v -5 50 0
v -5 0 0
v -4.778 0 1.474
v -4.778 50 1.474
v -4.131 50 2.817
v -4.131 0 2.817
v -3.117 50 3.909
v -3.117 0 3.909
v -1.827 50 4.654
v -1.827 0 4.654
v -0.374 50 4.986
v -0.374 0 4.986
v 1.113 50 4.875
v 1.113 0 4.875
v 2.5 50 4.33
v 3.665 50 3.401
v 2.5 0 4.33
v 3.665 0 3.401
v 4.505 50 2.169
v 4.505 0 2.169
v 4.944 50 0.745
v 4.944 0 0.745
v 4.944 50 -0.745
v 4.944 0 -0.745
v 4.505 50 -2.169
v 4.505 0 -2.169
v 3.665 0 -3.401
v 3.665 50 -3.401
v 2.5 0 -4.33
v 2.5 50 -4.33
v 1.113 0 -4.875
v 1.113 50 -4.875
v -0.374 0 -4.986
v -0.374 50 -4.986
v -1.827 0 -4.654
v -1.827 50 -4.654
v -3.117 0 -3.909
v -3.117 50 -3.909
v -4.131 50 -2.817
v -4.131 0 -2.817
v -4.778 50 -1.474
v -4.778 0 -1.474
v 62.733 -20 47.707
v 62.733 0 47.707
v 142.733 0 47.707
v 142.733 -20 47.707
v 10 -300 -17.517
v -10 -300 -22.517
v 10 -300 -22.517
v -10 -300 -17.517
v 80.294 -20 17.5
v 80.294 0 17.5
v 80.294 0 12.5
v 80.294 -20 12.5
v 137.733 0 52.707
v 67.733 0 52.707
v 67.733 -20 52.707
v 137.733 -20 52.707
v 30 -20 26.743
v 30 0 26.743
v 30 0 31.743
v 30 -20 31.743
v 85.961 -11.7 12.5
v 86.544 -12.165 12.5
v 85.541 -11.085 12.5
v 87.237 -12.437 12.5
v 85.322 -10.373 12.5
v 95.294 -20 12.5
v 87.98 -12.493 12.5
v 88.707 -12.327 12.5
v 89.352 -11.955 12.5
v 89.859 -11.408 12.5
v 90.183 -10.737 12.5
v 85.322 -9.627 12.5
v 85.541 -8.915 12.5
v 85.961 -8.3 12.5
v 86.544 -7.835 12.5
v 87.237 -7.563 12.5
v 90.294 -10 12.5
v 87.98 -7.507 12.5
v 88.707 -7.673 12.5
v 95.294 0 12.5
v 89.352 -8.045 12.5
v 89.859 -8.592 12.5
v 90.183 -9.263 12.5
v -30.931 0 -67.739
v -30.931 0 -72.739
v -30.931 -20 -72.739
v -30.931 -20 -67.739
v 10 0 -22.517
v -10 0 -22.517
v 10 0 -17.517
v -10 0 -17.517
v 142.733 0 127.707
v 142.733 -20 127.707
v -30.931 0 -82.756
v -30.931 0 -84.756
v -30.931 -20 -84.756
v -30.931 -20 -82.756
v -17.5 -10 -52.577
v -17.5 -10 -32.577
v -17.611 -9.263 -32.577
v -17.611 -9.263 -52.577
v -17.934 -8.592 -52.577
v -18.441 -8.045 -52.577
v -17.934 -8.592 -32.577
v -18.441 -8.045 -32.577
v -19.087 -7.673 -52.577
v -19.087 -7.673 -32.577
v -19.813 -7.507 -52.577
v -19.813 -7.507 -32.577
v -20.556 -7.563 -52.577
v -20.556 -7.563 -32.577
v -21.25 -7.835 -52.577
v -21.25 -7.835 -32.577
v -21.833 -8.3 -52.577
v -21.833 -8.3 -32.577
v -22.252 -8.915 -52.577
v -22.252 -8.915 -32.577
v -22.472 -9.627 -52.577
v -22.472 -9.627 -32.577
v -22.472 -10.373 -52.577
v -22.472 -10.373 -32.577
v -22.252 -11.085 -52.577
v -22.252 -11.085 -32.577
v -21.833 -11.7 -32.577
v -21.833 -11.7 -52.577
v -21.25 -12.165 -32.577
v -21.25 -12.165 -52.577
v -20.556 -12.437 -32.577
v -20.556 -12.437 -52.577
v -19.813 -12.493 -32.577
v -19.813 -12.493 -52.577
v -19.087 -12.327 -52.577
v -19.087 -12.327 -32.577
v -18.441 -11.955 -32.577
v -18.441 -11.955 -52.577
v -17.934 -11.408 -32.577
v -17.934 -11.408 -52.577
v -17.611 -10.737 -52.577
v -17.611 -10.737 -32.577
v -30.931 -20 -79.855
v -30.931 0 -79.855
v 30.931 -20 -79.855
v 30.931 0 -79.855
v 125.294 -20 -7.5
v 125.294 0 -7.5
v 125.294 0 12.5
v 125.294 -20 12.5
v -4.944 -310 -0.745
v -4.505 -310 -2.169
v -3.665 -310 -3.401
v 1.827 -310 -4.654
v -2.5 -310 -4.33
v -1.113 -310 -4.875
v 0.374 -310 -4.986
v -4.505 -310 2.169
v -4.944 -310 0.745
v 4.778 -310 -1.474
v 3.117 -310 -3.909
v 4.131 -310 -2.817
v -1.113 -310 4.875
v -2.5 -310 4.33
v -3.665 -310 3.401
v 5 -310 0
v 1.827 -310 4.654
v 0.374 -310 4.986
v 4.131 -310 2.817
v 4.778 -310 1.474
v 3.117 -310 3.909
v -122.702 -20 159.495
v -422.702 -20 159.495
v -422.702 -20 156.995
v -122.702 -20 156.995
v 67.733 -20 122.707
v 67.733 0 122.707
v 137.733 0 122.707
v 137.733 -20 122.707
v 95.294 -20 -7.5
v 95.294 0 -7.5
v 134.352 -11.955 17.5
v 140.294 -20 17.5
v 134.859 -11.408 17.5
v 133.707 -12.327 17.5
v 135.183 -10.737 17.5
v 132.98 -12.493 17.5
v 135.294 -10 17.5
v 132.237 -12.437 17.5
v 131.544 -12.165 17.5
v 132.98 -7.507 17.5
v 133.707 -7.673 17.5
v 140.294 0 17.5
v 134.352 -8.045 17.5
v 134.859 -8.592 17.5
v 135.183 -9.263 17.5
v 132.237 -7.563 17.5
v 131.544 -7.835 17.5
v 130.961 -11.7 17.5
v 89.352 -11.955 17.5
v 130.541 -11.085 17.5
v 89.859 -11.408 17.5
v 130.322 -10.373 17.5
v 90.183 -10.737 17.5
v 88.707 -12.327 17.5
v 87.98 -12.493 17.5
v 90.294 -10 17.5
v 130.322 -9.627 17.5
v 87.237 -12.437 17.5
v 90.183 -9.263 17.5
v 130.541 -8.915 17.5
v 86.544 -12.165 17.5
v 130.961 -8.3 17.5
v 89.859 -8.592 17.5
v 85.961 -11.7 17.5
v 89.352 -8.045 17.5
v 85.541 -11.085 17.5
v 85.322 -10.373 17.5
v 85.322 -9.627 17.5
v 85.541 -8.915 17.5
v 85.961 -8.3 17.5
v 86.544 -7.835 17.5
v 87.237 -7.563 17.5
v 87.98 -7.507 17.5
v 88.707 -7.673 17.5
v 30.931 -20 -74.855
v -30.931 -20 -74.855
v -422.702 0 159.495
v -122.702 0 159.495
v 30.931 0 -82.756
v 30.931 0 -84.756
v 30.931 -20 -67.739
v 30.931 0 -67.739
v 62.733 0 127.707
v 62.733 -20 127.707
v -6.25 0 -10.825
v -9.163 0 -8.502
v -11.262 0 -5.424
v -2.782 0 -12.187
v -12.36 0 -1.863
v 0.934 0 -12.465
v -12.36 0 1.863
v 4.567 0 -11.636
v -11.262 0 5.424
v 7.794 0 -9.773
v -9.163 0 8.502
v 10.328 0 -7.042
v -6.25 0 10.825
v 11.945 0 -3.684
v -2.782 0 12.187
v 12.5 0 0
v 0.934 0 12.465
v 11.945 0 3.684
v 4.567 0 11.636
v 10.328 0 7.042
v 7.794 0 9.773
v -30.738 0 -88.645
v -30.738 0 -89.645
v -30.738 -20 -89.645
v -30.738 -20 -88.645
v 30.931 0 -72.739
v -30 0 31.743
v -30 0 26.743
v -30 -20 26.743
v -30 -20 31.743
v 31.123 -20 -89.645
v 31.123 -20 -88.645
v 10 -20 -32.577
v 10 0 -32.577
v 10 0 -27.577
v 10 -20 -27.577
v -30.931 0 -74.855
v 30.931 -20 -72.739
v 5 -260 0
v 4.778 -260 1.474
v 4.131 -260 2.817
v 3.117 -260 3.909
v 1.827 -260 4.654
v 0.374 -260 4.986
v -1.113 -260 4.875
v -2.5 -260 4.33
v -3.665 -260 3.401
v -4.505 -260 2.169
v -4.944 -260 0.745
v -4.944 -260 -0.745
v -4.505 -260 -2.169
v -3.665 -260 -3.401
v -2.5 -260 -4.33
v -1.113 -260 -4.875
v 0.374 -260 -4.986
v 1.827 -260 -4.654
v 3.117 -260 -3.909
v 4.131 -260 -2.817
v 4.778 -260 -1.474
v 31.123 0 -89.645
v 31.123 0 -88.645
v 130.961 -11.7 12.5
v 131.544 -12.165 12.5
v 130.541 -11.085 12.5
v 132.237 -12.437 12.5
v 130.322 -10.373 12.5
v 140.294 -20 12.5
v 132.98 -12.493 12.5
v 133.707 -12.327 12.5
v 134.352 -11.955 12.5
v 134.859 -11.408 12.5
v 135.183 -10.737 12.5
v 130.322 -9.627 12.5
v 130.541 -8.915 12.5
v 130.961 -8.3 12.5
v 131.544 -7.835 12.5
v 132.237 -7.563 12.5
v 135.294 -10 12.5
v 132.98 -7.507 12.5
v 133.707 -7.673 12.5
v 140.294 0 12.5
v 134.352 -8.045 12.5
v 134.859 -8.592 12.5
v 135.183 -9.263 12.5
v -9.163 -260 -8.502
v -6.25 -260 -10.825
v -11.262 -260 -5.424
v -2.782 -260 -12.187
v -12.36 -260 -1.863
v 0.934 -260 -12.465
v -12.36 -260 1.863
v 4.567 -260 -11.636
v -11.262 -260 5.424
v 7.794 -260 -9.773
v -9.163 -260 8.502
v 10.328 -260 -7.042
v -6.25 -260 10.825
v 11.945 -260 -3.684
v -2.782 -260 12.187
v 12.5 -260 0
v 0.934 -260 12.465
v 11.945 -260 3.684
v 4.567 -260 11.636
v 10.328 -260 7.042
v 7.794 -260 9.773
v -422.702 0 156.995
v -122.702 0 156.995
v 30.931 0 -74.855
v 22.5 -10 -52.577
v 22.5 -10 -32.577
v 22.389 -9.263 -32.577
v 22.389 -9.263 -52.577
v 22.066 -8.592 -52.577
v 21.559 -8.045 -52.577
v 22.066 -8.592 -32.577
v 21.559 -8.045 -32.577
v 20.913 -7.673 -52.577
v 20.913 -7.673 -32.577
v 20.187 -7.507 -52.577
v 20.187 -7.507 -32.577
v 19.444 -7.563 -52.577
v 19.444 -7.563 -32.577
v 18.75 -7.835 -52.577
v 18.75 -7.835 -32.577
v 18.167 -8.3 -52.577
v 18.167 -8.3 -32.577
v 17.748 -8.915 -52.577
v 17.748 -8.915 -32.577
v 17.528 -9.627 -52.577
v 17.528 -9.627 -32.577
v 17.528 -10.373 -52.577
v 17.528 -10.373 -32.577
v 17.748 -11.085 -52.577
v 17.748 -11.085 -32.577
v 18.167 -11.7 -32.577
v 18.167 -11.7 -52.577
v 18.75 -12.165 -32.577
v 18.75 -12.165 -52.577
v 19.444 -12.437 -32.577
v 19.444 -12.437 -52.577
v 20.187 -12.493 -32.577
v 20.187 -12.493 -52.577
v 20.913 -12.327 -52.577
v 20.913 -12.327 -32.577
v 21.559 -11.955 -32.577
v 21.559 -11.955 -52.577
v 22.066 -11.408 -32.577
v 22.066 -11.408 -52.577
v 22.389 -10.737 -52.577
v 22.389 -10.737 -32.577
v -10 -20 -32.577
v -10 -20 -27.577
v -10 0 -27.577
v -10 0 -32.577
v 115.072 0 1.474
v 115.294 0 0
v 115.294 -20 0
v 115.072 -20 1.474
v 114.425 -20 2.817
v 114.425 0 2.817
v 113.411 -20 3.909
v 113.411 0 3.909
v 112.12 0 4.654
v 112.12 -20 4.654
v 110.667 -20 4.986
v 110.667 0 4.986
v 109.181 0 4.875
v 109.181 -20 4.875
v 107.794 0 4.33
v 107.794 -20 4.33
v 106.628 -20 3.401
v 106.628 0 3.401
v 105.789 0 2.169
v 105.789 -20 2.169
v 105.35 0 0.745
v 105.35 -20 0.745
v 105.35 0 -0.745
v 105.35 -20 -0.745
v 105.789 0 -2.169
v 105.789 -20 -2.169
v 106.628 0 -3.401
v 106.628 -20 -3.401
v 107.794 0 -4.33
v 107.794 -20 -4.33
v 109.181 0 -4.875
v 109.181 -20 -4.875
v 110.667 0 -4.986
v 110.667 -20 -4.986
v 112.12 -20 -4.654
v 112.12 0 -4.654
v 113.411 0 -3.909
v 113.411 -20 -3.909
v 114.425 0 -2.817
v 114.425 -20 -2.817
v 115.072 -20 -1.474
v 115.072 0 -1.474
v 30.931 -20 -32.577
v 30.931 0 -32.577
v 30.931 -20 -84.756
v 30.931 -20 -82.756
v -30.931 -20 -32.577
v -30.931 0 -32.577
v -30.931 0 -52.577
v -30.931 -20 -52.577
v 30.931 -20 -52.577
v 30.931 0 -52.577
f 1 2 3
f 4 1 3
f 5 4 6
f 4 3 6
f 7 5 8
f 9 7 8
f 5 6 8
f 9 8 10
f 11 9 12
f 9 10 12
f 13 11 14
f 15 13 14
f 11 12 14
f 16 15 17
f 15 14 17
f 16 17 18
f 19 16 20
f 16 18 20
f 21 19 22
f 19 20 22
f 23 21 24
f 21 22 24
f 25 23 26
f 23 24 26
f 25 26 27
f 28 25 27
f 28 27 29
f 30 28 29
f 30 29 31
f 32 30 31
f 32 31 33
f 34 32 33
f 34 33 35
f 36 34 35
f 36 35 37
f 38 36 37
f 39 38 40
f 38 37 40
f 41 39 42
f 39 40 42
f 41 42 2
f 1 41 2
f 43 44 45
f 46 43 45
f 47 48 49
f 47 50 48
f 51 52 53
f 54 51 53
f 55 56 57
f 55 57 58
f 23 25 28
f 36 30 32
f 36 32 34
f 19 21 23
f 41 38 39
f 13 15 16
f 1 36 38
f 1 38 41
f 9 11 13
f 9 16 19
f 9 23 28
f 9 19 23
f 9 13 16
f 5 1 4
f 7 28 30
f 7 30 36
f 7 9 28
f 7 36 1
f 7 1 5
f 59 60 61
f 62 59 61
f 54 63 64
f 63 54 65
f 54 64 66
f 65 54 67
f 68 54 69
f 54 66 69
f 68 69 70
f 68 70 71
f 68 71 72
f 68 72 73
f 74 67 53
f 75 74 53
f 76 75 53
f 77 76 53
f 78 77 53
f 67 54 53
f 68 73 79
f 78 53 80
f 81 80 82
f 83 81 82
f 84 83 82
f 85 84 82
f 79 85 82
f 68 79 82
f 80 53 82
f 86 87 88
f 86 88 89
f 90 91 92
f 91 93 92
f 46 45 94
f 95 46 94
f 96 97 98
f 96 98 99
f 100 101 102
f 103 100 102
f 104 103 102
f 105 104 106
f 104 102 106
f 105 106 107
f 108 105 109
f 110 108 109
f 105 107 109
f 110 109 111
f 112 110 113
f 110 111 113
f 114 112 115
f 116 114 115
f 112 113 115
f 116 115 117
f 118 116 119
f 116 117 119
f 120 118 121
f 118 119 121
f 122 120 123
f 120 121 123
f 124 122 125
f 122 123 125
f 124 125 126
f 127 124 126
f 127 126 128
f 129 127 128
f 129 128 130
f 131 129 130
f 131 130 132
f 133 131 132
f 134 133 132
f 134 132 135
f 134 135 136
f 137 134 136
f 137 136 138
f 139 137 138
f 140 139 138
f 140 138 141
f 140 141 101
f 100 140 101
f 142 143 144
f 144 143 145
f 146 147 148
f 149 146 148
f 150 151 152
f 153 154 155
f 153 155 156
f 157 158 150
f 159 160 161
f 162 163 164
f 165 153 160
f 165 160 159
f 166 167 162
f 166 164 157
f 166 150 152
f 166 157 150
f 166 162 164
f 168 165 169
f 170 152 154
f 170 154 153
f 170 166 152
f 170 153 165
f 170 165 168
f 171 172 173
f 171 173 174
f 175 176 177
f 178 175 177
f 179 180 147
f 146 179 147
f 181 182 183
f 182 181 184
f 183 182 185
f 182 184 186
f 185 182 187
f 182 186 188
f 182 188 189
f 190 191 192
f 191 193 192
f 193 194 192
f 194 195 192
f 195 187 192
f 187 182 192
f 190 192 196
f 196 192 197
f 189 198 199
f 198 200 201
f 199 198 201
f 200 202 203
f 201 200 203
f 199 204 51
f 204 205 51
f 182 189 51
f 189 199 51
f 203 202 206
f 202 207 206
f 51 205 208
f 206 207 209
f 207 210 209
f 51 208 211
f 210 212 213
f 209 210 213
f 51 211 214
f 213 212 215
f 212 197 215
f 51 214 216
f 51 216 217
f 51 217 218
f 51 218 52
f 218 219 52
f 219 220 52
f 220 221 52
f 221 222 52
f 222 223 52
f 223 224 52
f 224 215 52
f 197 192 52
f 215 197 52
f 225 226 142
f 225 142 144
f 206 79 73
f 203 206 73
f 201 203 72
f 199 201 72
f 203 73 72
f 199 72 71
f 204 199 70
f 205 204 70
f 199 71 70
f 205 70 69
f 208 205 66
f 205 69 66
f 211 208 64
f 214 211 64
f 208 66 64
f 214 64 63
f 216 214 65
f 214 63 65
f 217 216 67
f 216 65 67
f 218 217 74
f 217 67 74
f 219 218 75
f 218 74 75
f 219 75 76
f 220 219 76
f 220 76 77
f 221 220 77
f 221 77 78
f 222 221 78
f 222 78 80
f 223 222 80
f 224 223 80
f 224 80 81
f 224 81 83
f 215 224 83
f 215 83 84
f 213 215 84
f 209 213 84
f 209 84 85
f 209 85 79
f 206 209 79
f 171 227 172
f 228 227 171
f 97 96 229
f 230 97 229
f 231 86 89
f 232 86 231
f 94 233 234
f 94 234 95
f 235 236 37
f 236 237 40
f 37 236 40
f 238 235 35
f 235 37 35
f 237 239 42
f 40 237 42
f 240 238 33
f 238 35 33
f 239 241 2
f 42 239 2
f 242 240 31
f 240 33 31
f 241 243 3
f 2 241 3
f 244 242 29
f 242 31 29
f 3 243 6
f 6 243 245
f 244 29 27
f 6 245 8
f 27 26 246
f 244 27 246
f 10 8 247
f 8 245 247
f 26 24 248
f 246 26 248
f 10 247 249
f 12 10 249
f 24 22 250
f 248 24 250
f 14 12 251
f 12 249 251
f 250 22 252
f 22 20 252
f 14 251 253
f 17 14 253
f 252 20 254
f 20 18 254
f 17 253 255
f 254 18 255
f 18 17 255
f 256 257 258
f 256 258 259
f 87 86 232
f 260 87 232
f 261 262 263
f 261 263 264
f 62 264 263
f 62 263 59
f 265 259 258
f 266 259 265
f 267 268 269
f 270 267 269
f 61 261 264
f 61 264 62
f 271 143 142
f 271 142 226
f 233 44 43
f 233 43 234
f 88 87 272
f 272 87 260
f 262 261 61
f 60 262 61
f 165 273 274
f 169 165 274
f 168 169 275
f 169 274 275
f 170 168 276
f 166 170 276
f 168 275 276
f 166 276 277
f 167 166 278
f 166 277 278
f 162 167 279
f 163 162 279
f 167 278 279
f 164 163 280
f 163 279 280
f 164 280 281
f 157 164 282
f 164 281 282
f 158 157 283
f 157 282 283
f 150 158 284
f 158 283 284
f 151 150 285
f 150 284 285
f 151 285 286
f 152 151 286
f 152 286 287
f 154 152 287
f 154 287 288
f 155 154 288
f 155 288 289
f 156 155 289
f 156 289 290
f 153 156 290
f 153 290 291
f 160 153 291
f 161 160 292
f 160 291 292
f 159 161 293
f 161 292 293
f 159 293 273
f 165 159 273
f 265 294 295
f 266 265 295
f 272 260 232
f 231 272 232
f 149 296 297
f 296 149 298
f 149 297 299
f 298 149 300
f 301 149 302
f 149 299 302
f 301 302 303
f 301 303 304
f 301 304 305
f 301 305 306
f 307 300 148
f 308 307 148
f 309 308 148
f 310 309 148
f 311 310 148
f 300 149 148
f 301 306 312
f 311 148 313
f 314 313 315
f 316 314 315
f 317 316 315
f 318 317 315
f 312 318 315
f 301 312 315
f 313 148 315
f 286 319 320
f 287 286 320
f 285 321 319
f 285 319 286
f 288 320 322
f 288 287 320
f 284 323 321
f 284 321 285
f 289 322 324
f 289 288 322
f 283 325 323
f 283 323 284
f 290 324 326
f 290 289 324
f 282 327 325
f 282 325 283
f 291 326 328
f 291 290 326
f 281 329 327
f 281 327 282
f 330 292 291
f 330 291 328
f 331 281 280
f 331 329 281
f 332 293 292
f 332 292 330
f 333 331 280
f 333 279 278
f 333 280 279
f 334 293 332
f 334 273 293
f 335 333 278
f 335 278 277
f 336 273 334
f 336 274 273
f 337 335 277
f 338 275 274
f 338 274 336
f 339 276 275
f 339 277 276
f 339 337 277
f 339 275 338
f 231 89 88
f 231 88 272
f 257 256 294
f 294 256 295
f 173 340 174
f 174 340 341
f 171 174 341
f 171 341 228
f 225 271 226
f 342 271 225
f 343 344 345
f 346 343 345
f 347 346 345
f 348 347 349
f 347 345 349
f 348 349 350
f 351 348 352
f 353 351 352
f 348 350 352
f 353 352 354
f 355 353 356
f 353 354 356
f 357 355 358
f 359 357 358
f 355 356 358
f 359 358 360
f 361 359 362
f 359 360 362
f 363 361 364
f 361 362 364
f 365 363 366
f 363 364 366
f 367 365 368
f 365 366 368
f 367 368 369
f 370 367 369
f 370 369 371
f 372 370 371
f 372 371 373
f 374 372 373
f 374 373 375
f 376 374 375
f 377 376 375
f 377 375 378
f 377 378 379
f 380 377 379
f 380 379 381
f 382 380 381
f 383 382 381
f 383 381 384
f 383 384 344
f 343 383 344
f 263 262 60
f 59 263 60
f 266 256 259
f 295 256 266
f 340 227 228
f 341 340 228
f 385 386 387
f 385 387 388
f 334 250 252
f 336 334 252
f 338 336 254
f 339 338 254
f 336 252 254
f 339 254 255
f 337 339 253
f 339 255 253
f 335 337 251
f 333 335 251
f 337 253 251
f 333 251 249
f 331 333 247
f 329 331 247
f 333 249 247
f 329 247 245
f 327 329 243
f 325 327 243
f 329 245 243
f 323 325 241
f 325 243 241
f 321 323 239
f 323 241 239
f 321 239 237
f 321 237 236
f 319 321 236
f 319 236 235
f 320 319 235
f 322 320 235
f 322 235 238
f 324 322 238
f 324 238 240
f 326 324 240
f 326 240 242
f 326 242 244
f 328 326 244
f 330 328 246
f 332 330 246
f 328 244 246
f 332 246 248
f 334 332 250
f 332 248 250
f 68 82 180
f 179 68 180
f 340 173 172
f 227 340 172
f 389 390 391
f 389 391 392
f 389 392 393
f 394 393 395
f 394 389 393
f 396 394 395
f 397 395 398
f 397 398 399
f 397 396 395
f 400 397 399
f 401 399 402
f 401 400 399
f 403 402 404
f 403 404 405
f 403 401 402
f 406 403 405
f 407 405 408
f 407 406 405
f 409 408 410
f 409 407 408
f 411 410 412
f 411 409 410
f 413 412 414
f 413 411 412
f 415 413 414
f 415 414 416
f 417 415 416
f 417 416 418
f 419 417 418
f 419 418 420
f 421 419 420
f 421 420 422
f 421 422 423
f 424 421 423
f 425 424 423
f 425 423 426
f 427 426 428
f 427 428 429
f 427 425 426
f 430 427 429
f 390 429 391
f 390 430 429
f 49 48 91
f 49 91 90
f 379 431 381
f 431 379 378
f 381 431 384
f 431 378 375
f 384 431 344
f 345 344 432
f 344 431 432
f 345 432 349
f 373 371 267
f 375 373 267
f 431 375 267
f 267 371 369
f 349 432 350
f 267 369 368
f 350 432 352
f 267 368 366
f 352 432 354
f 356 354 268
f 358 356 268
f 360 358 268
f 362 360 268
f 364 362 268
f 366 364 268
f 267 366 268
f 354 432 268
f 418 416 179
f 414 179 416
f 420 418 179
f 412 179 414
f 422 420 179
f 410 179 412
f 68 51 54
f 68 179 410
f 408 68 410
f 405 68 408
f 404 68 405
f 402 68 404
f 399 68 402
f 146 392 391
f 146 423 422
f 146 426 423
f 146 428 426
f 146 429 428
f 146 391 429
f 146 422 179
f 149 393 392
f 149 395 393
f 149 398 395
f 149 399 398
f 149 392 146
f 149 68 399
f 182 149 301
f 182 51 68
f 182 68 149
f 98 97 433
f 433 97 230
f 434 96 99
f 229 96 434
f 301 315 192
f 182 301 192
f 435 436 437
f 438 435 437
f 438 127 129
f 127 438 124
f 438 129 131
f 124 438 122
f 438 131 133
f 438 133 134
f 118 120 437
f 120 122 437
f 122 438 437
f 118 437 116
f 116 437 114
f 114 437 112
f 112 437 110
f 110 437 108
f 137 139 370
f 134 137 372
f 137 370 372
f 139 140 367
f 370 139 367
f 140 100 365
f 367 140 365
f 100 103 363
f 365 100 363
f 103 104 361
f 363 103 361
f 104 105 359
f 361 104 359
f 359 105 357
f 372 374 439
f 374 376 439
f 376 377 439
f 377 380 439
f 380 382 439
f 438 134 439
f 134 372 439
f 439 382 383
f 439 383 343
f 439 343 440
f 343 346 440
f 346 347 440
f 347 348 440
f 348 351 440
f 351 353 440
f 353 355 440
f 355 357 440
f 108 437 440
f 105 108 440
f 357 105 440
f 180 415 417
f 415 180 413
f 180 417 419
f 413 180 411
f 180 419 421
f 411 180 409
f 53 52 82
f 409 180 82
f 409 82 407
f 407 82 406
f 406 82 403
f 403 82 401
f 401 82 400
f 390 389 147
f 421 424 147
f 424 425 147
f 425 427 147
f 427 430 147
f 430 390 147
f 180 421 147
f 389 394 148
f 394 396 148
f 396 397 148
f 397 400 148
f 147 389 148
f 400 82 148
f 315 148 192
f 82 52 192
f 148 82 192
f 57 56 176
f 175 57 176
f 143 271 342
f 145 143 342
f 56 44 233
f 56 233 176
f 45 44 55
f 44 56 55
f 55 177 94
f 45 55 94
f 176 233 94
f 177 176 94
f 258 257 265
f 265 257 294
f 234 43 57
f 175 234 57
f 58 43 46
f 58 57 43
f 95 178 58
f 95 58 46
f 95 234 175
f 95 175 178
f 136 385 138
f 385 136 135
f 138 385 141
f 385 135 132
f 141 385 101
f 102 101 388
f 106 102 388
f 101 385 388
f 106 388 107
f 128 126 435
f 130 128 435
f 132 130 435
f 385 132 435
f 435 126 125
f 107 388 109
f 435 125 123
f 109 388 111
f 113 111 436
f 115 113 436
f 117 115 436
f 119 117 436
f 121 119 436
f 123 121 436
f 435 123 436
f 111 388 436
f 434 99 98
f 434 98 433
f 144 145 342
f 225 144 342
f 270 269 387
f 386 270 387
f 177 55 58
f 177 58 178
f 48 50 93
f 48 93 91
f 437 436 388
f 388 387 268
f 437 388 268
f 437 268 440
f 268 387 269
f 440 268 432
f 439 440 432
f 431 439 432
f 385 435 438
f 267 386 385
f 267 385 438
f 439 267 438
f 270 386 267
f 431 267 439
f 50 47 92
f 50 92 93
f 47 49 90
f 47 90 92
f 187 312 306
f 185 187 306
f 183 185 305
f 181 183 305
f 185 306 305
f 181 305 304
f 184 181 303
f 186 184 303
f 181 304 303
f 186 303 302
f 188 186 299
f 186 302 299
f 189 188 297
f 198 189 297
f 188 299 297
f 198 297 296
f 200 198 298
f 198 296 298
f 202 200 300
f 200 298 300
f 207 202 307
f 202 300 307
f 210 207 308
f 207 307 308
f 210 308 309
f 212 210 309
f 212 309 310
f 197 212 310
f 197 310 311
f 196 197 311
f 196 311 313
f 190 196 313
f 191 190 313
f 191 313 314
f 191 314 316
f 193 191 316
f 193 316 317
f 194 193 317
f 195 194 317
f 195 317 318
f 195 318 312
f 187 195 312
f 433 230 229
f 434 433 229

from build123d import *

# Parameters (mm, degrees)
F0_R      = 5
F1_DEPTH  = 20
F0_W      = 60
F0_H      = 5
F0_W_2    = 80
F0_H_2    = 80
F0_W_3    = 70
F0_H_3    = 70
F0_W_4    = 61.861140081
F0_H_4    = 1
F0_H_5    = 2
F0_W_5    = 300
F0_H_6    = 2.5
F0_R_2    = 12.5
F2_DEPTH  = 260
F3_R      = 5
F4_DEPTH  = 50
F5_DEPTH  = 300
F6_R      = 2.5
F7_R      = 2.5
F8_DEPTH  = 25
F10_R     = 2.5
F9_R      = 2.5
F11_DEPTH = 25
F17_R     = 5
F18_DEPTH = 50


# Not quite as in the source:
# - a feature of the source that left no trace in its solid (it failed there, or was rolled back) is left out
# - a feature names something its author has since deleted; it is built from what else it names


with BuildPart() as f1:
    # F0 (on Front) → F1 (new body)
    with BuildSketch(Plane.XZ):
        Polygon((95.2936565876, -7.5), (110.2936565876, -7.5), (125.2936565876, -7.5), (125.2936565876, 12.5), (140.2936565876, 12.5), (140.2936565876, 17.5), (110.2936565876, 17.5), (80.2936565876, 17.5), (80.2936565876, 12.5), (95.2936565876, 12.5), align=None)
        with Locations((110.2936565876, 0)):
            Circle(F0_R, mode=Mode.SUBTRACT)
    extrude(amount=F1_DEPTH)

    # F10 (on face) + F9 (on face) → F11 (cut)
    with BuildSketch(Plane(origin=(0, 0, 12.5), x_dir=(1, 0, 0), z_dir=(0, 0, -1))):
        with Locations((87.7936565876, 10)):
            Circle(F10_R)
    with BuildSketch(Plane(origin=(0, 0, 12.5), x_dir=(1, 0, 0), z_dir=(0, 0, -1))):
        with Locations((132.7936565876, 10)):
            Circle(F9_R)
    extrude(amount=-F11_DEPTH, mode=Mode.SUBTRACT)


with BuildPart() as f1b:
    # F0 (on Front) → F1, piece 2 (new body)
    with BuildSketch(Plane.XZ):
        with Locations((0, 29.2427036911)):
            Rectangle(F0_W, F0_H)
    extrude(amount=F1_DEPTH)


with BuildPart() as f1c:
    # F0 (on Front) → F1, piece 3 (new body)
    with BuildSketch(Plane.XZ):
        Polygon((10, -27.5771580637), (0, -27.5771580637), (-10, -27.5771580637), (-10, -32.5771580637), (-10.9305700405, -32.5771580637), (-30.9305700405, -32.5771580637), (-30.9305700405, -52.5771580637), (0, -52.5771580637), (30.9305700405, -52.5771580637), (30.9305700405, -32.5771580637), (10.9305700405, -32.5771580637), (10, -32.5771580637), align=None)
    extrude(amount=F1_DEPTH)

    # F6 (on face) + F7 (on face) → F8 (cut)
    with BuildSketch(Plane.XY.offset(-32.5771580637)):
        with Locations((-20, -10)):
            Circle(F6_R)
    with BuildSketch(Plane.XY.offset(-32.5771580637)):
        with Locations((20, -10)):
            Circle(F7_R)
    extrude(amount=-F8_DEPTH, mode=Mode.SUBTRACT)


with BuildPart() as f1d:
    # F0 (on Front) → F1, piece 4 (new body)
    with BuildSketch(Plane.XZ):
        with Locations((102.7326732874, 87.7068325877)):
            Rectangle(F0_W_2, F0_H_2)
        with Locations((102.7326732874, 87.7068325877)):
            Rectangle(F0_W_3, F0_H_3, mode=Mode.SUBTRACT)
    extrude(amount=F1_DEPTH)


with BuildPart() as f1e:
    # F0 (on Front) → F1, piece 5 (new body)
    with BuildSketch(Plane.XZ):
        with Locations((0, -77.355325222)):
            Rectangle(F0_W_4, F0_H)
    extrude(amount=F1_DEPTH)


with BuildPart() as f1f:
    # F0 (on Front) → F1, piece 6 (new body)
    with BuildSketch(Plane.XZ):
        with Locations((0.1928325291, -89.1451310813)):
            Rectangle(F0_W_4, F0_H_4)
    extrude(amount=F1_DEPTH)


with BuildPart() as f1g:
    # F0 (on Front) → F1, piece 7 (new body)
    with BuildSketch(Plane.XZ):
        with Locations((0, -83.756296128)):
            Rectangle(F0_W_4, F0_H_5)
    extrude(amount=F1_DEPTH)


with BuildPart() as f1h:
    # F0 (on Front) → F1, piece 8 (new body)
    with BuildSketch(Plane.XZ):
        with Locations((0, -70.2389810979)):
            Rectangle(F0_W_4, F0_H)
    extrude(amount=F1_DEPTH)


with BuildPart() as f1i:
    # F0 (on Front) → F1, piece 9 (new body)
    with BuildSketch(Plane.XZ):
        with Locations((-272.7023124695, 158.2453411818)):
            Rectangle(F0_W_5, F0_H_6)
    extrude(amount=F1_DEPTH)


with BuildPart() as f2:
    # F0 (on Front) → F2 (new body)
    with BuildSketch(Plane.XZ):
        Circle(F0_R_2)
    extrude(amount=F2_DEPTH)

    # F3 (on face) → F4 (join)
    with BuildSketch(Plane.XZ.offset(260)):
        Circle(F3_R)
    extrude(amount=F4_DEPTH)

    # F17 (on face) → F18 (join)
    with BuildSketch(Plane(origin=(0, 0, 0), x_dir=(-1, 0, 0), z_dir=(0, 1, 0))):
        Circle(F17_R)
    extrude(amount=F18_DEPTH)


with BuildPart() as f5:
    # F0 (on Front) → F5 (new body)
    with BuildSketch(Plane.XZ):
        Polygon((-10, -22.5167013705), (0, -22.5167013705), (10, -22.5167013705), (10, -17.5167013705), (0, -17.5167013705), (-10, -17.5167013705), align=None)
    extrude(amount=F5_DEPTH)


solid = Compound([f1.part, f1b.part, f1c.part, f1d.part, f1e.part, f1f.part, f1g.part, f1h.part, f1i.part, f2.part, f5.part])
